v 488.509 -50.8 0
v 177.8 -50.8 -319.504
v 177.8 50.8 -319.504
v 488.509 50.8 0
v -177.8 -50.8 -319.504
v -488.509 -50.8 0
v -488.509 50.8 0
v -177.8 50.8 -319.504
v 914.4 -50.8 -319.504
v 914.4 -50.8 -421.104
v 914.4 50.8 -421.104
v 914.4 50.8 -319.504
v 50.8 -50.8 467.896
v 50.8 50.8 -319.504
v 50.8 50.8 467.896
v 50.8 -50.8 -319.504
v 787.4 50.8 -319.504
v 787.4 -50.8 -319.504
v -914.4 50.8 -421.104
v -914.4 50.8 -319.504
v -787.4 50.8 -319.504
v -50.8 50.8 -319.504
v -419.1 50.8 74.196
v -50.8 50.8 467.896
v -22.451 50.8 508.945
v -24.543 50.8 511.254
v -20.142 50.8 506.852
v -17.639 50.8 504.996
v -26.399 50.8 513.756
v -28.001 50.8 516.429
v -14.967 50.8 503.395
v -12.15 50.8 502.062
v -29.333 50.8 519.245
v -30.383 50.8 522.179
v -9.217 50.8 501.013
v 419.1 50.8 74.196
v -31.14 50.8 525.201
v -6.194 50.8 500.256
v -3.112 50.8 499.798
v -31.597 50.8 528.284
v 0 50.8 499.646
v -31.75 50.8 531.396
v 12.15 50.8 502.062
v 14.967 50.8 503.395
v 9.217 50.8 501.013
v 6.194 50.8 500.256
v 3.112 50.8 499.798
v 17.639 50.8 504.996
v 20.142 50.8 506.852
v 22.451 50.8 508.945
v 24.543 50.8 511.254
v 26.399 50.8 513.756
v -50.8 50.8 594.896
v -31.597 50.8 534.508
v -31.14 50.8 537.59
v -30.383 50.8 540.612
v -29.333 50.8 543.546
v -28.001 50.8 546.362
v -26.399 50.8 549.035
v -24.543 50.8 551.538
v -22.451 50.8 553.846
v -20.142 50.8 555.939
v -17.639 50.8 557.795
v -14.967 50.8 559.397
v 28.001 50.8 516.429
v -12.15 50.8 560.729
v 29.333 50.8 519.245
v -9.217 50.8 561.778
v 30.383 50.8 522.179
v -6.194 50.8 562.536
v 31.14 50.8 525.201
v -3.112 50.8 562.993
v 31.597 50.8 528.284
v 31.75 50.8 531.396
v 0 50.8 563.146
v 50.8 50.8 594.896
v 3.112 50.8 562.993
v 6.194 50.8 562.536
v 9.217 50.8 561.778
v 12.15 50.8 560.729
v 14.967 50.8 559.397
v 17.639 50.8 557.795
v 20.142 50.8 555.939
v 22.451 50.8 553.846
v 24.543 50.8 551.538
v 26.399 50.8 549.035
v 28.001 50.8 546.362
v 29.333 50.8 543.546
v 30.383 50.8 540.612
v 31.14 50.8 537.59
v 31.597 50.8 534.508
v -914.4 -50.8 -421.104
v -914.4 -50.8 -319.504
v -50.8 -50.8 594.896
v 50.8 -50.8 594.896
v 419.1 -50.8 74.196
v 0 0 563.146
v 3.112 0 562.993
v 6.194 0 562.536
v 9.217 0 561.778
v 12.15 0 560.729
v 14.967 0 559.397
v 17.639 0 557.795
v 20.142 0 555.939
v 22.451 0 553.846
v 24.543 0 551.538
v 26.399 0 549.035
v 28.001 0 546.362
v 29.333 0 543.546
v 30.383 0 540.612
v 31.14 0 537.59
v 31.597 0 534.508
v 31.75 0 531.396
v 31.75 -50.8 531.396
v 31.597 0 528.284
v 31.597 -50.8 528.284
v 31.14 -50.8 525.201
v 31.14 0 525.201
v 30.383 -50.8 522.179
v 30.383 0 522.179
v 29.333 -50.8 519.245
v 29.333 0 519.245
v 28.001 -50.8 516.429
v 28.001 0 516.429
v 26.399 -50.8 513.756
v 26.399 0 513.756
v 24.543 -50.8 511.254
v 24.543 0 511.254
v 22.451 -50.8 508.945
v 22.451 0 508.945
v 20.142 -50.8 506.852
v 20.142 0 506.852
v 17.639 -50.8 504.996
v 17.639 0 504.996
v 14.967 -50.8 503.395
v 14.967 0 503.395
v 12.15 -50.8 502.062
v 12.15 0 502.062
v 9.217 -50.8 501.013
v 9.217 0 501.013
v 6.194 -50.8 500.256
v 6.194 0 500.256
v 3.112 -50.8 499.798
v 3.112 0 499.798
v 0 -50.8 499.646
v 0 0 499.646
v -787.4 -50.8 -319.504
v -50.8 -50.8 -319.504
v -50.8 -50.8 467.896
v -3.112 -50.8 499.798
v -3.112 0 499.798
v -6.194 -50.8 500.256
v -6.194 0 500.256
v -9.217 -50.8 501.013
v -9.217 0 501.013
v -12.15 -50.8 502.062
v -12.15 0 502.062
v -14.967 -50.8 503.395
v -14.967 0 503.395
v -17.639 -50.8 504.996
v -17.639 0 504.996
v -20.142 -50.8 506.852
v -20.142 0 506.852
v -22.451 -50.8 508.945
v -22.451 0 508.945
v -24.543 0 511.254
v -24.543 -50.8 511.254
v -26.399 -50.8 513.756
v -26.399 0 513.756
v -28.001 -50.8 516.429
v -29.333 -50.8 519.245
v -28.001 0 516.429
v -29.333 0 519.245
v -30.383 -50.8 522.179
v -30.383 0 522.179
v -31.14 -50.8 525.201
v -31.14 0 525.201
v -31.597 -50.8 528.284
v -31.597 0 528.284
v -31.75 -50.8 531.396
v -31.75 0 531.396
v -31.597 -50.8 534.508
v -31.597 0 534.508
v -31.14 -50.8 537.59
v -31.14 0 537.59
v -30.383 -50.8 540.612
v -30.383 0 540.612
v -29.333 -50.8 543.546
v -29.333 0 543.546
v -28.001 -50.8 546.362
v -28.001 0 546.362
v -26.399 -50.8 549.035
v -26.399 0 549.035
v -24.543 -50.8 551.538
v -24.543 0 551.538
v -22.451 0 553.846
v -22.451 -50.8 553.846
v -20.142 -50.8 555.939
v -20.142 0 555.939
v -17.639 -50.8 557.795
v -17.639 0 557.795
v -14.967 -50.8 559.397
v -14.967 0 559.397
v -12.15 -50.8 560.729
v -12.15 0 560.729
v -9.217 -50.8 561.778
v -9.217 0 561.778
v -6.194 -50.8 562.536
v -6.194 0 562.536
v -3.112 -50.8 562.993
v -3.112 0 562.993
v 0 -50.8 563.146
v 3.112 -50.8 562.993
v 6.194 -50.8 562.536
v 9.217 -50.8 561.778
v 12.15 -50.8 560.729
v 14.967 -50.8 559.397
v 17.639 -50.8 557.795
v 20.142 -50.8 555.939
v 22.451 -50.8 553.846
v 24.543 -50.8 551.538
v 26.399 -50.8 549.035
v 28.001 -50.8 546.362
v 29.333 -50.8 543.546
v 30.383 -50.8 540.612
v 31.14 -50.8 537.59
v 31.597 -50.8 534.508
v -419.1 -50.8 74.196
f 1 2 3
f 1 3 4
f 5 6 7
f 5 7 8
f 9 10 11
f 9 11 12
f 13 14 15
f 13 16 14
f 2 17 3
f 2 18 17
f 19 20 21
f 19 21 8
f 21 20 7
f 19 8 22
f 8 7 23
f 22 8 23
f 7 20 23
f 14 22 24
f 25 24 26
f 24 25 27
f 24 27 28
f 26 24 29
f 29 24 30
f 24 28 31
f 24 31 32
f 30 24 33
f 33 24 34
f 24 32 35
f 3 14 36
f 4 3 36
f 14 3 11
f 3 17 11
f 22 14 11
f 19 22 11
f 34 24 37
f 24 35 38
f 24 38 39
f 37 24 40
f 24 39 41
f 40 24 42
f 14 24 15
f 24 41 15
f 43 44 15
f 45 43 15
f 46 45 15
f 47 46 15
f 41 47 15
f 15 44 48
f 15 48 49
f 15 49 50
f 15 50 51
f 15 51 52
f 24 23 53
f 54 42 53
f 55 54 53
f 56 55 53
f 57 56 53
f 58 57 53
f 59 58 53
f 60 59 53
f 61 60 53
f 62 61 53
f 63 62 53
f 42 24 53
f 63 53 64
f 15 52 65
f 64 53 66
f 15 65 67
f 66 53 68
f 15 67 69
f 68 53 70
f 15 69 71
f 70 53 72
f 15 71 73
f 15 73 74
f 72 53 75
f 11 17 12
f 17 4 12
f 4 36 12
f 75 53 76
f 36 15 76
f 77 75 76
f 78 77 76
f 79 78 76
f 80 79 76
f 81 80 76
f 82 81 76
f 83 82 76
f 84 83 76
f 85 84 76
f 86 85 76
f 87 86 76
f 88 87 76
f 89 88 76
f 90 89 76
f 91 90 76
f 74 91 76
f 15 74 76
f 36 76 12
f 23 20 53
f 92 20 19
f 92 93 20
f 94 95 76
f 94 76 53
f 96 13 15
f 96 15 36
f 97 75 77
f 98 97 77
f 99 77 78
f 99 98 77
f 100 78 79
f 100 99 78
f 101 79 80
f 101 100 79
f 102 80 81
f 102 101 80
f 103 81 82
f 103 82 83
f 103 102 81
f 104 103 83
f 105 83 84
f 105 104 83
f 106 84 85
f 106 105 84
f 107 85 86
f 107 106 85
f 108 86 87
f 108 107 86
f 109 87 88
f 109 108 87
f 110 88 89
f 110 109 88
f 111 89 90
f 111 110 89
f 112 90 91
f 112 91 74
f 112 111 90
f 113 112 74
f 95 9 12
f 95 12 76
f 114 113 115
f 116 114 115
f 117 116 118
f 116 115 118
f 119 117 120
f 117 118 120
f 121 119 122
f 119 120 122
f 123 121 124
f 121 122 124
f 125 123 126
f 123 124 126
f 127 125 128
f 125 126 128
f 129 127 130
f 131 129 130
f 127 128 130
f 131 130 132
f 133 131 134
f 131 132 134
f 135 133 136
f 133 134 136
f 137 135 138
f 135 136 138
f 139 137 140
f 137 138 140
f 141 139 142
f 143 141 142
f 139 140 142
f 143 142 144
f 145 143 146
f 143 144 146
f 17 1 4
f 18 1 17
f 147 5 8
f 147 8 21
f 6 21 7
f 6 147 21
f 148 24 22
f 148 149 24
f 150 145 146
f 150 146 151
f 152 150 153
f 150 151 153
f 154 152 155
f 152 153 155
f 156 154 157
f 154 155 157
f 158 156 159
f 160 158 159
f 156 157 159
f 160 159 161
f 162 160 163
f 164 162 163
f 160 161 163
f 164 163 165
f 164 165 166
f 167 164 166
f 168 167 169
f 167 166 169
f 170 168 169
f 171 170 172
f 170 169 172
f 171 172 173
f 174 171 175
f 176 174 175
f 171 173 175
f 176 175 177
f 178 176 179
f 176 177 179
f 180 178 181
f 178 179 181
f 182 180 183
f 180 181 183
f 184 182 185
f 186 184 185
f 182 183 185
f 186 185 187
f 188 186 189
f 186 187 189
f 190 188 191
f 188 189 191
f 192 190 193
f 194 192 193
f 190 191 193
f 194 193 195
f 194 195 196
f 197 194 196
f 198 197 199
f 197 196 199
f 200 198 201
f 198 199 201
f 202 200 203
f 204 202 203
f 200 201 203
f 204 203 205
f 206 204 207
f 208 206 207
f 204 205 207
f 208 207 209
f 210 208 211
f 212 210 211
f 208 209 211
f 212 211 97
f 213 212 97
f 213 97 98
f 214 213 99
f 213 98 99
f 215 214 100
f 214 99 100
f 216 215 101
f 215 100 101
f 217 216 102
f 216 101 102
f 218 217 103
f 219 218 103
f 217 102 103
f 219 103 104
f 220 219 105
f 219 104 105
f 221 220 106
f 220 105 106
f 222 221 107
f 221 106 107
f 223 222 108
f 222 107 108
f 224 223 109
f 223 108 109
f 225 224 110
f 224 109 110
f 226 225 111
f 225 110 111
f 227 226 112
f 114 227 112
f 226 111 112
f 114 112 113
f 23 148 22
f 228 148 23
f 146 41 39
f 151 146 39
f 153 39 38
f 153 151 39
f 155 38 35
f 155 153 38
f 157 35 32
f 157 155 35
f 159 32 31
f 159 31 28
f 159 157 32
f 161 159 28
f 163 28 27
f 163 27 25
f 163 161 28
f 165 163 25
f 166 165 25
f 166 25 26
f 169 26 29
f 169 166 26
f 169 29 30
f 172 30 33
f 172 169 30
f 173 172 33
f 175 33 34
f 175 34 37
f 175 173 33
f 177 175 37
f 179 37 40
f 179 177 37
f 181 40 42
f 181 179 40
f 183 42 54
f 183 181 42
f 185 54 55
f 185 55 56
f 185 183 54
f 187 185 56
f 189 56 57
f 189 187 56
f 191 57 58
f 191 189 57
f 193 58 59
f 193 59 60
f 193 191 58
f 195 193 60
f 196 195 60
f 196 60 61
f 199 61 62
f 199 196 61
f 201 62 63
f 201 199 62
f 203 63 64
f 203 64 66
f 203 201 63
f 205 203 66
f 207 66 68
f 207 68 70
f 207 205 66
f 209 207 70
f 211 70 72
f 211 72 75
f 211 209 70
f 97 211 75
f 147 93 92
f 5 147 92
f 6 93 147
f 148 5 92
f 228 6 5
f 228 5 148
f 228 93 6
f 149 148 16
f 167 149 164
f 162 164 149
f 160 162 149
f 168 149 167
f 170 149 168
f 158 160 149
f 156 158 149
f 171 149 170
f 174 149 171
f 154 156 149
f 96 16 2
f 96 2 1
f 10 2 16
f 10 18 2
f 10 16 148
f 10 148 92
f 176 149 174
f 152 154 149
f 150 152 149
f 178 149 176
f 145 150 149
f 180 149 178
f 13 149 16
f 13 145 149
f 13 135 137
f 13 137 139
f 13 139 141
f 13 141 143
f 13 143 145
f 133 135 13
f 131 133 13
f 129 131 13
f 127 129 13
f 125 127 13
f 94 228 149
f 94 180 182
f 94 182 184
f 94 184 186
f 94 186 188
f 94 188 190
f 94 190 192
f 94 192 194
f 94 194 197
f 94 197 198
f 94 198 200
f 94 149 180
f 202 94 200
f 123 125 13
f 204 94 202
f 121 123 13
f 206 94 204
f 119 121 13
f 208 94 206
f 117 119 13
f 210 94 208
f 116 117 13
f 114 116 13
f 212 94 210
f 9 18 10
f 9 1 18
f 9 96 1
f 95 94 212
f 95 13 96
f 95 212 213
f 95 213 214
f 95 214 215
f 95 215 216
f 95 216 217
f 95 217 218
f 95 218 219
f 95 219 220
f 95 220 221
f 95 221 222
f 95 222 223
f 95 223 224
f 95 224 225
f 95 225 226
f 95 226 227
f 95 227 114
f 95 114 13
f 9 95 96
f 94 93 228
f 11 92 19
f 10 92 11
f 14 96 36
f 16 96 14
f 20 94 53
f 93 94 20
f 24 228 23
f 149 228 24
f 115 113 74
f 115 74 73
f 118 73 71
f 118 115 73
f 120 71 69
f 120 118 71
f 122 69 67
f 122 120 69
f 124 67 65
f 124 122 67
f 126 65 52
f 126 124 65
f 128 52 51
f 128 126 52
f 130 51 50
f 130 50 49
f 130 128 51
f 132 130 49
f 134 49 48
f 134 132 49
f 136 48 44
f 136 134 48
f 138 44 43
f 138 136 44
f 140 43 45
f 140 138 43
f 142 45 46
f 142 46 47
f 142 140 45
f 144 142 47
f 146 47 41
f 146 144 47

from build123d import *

# Parameters (mm, degrees)
F0_W     = 50.8
F0_H     = 101.6
F1_DEPTH = 50.8


with BuildPart() as f1:
    # F0 (on Front) → F1 (new body, symmetric)
    with BuildSketch(Plane.XZ):
        Polygon((-488.5087642836, 0), (-419.1, 74.1955756135), (-50.8, 467.8955756135), (-50.8, 594.8955756135), (-914.4, -319.5044243865), (-787.4, -319.5044243865), align=None)
        Polygon((-177.8, -319.5044243865), (-50.8, -319.5044243865), (-419.1, 74.1955756135), (-488.5087642836, 0), align=None)
        Polygon((-50.8, -421.1044243865), (-50.8, -319.5044243865), (-177.8, -319.5044243865), (-787.4, -319.5044243865), (-914.4, -319.5044243865), (-914.4, -421.1044243865), align=None)
        with BuildLine():
            Line((-50.8, -319.5044243865), (0, -319.5044243865))
            Line((0, -319.5044243865), (0, 499.6455756135))
            ThreePointArc((0, 499.6455756135), (-31.75, 531.3955756135), (0, 563.1455756135))
            Line((0, 563.1455756135), (0, 594.8955756135))
            Line((0, 594.8955756135), (-50.8, 594.8955756135))
            Line((-50.8, 594.8955756135), (-50.8, 467.8955756135))
            Line((-50.8, 467.8955756135), (-50.8, -319.5044243865))
        make_face()
        with BuildLine():
            Line((0, 499.6455756135), (0, -319.5044243865))
            Line((0, -319.5044243865), (50.8, -319.5044243865))
            Line((50.8, -319.5044243865), (50.8, 467.8955756135))
            Line((50.8, 467.8955756135), (50.8, 594.8955756135))
            Line((50.8, 594.8955756135), (0, 594.8955756135))
            Line((0, 594.8955756135), (0, 563.1455756135))
            ThreePointArc((0, 563.1455756135), (22.4506403027, 553.8462159162), (31.75, 531.3955756135))
            ThreePointArc((31.75, 531.3955756135), (22.4506403027, 508.9449353108), (0, 499.6455756135))
        make_face()
        with Locations((25.4, -370.3044243865)):
            Rectangle(F0_W, F0_H)
        with Locations((-25.4, -370.3044243865)):
            Rectangle(F0_W, F0_H)
        Polygon((177.8, -319.5044243865), (50.8, -319.5044243865), (50.8, -421.1044243865), (914.4, -421.1044243865), (914.4, -319.5044243865), (787.4, -319.5044243865), align=None)
        Polygon((50.8, 594.8955756135), (50.8, 467.8955756135), (419.1, 74.1955756135), (488.5087642836, 0), (787.4, -319.5044243865), (914.4, -319.5044243865), align=None)
        Polygon((419.1, 74.1955756135), (50.8, -319.5044243865), (177.8, -319.5044243865), (488.5087642836, 0), align=None)
    extrude(amount=F1_DEPTH, both=True)


solid = f1.part
